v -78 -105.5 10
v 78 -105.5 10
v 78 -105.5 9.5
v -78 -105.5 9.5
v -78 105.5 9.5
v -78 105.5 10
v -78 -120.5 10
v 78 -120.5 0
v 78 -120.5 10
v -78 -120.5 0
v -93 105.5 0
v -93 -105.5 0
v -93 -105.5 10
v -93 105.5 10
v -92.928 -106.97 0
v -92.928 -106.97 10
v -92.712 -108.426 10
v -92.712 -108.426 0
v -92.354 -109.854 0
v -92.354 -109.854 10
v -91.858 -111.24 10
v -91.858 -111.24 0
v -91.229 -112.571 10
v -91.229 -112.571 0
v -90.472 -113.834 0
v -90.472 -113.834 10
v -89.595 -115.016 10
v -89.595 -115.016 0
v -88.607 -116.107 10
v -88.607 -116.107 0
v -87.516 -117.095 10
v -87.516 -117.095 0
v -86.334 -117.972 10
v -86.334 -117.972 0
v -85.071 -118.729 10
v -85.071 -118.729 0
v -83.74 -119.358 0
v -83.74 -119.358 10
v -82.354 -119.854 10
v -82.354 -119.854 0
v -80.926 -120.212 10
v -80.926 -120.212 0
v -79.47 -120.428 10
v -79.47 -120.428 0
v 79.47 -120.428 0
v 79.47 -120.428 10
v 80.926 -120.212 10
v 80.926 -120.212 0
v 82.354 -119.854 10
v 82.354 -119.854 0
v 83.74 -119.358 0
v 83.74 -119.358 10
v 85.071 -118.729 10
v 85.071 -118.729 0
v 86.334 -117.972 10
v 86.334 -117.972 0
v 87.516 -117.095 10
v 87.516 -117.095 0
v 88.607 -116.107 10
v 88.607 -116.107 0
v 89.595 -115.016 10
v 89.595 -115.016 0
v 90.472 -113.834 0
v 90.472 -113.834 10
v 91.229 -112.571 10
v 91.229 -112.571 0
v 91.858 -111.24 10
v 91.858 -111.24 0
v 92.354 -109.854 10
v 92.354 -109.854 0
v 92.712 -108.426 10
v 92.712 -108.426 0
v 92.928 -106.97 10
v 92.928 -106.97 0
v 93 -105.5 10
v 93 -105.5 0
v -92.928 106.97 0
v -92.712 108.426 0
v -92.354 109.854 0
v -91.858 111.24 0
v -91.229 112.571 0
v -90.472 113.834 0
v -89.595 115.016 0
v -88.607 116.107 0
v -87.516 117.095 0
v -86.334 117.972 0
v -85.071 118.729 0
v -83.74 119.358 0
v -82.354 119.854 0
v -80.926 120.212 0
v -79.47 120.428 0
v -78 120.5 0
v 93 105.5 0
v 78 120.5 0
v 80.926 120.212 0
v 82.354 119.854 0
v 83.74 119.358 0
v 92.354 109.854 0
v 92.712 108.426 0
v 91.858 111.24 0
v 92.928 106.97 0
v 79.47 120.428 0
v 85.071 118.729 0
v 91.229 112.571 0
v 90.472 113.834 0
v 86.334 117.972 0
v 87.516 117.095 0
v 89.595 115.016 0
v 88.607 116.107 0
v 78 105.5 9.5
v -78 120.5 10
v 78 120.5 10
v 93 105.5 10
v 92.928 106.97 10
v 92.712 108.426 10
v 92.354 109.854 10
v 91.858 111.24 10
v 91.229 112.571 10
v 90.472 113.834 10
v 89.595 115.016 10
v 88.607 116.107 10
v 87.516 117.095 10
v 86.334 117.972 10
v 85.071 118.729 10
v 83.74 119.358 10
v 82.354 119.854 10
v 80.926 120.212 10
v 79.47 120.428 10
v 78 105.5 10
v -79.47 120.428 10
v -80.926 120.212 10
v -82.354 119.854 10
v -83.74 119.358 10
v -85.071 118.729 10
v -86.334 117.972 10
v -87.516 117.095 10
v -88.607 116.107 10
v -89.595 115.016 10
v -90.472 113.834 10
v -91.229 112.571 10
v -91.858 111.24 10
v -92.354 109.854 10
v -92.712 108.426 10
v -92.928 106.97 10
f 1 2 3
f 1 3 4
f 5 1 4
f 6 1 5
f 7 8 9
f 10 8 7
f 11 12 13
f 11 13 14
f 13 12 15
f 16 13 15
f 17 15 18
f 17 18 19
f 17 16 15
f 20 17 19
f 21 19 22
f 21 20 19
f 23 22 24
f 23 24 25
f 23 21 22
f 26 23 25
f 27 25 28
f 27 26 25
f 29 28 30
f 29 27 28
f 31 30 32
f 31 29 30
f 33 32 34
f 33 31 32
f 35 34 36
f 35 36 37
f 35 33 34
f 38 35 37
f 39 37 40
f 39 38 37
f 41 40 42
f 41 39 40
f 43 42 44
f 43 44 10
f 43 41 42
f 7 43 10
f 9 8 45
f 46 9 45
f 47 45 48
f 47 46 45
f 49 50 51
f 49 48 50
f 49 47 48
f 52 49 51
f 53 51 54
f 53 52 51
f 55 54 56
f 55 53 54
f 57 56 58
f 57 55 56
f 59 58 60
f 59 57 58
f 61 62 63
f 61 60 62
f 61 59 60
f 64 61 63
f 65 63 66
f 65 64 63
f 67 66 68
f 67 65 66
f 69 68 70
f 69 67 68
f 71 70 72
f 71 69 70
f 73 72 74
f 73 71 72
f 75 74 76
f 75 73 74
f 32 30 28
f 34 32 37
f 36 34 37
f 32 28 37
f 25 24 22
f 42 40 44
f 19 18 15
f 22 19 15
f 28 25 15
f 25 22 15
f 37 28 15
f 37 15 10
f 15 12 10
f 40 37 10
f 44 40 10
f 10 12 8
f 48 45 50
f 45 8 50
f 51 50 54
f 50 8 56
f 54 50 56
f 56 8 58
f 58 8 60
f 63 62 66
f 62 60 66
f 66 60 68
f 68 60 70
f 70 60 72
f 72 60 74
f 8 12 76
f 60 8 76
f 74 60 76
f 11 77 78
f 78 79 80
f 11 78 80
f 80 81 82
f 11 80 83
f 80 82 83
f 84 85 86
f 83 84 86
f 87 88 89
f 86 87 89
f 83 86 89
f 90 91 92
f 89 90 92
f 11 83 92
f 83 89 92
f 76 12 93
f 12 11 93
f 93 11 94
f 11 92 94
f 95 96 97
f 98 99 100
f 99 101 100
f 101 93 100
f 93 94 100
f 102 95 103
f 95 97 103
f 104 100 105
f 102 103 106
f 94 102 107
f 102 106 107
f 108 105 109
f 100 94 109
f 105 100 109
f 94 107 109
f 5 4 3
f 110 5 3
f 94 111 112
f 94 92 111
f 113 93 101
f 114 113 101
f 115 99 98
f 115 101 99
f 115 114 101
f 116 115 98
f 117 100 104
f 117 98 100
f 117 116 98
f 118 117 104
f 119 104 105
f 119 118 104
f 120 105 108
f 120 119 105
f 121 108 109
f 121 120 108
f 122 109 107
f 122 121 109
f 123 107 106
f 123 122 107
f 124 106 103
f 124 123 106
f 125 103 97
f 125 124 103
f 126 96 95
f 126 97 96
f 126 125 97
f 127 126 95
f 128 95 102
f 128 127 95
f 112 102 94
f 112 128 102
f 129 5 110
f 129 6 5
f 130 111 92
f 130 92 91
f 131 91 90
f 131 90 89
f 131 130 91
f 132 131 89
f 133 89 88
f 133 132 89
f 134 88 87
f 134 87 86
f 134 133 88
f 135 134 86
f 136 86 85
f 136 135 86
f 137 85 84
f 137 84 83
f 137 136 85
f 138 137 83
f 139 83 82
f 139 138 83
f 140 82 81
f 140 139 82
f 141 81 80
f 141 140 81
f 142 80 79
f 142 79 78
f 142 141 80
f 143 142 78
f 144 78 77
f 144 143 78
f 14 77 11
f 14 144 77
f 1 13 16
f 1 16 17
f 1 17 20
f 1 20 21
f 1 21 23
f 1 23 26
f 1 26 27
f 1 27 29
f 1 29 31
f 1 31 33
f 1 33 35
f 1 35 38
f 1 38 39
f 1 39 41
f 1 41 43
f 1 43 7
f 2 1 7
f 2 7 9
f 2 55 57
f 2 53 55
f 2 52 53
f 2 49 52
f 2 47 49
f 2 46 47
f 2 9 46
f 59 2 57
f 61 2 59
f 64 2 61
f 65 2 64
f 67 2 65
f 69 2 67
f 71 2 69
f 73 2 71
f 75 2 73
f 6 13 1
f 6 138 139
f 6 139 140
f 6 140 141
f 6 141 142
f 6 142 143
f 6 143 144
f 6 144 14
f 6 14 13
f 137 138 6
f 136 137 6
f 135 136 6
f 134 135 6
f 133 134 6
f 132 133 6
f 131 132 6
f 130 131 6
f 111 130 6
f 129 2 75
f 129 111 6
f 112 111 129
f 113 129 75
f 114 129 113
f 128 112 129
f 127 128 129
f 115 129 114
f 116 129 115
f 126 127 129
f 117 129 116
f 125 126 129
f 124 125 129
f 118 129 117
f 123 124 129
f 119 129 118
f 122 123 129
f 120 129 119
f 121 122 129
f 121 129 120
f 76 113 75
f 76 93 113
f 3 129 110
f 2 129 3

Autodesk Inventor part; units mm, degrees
ref_plane "YZ Plane" through (0, 0, 0) normal (1, 0, 0) x (0, 1, 0)
ref_plane "XZ Plane" through (0, 0, 0) normal (0, 1, 0) x (-1, 0, 0)
ref_plane "XY Plane" through (0, 0, 0) normal (0, 0, 1) x (1, 0, 0)
sketch "Skizze1" plane through (0, 0, 0) normal (0, 0, 1) x (1, 0, 0)
  line L0 (-93, 120.5) -> (93, 120.5)
  line L1 (93, 120.5) -> (93, -120.5)
  line L2 (93, -120.5) -> (-93, -120.5)
  line L3 (-93, -120.5) -> (-93, 120.5)
  line L4 (-130.2, 0) -> (130.2, 0) projected
  line L5 (0, -168.7) -> (0, 168.7) projected
  point P0 (0, 0)
  dimension "d0" = 241
  dimension "d1" = 186
extrude "Extrusion1" add sketch "Skizze1" along normal blind 10
sketch "Skizze3" plane through (0, 0, 10) normal (0, 0, 1) x (1, 0, 0)
  line L0 (93, 120.5) -> (93, -120.5) projected
  line L1 (-93, 120.5) -> (93, 120.5) projected
  line L2 (-93, -120.5) -> (-93, 120.5) projected
  line L3 (93, -120.5) -> (-93, -120.5) projected
  line L4 (78, 105.5) -> (78, -105.5)
  line L5 (78, -105.5) -> (-78, -105.5)
  line L6 (-78, -105.5) -> (-78, 105.5)
  line L7 (-78, 105.5) -> (78, 105.5)
  point P0 (0, 0)
  dimension "d5" = 15
extrude "Extrusion2" cut sketch "Skizze3" against normal blind 0.5 contours L4 L5 L6 L7
fillet "Rundung2" radius 15 4 edges at (-93, -120.5, 5) (93, -120.5, 5) (93, 120.5, 5) (-93, 120.5, 5)
properties part number "tablet"
